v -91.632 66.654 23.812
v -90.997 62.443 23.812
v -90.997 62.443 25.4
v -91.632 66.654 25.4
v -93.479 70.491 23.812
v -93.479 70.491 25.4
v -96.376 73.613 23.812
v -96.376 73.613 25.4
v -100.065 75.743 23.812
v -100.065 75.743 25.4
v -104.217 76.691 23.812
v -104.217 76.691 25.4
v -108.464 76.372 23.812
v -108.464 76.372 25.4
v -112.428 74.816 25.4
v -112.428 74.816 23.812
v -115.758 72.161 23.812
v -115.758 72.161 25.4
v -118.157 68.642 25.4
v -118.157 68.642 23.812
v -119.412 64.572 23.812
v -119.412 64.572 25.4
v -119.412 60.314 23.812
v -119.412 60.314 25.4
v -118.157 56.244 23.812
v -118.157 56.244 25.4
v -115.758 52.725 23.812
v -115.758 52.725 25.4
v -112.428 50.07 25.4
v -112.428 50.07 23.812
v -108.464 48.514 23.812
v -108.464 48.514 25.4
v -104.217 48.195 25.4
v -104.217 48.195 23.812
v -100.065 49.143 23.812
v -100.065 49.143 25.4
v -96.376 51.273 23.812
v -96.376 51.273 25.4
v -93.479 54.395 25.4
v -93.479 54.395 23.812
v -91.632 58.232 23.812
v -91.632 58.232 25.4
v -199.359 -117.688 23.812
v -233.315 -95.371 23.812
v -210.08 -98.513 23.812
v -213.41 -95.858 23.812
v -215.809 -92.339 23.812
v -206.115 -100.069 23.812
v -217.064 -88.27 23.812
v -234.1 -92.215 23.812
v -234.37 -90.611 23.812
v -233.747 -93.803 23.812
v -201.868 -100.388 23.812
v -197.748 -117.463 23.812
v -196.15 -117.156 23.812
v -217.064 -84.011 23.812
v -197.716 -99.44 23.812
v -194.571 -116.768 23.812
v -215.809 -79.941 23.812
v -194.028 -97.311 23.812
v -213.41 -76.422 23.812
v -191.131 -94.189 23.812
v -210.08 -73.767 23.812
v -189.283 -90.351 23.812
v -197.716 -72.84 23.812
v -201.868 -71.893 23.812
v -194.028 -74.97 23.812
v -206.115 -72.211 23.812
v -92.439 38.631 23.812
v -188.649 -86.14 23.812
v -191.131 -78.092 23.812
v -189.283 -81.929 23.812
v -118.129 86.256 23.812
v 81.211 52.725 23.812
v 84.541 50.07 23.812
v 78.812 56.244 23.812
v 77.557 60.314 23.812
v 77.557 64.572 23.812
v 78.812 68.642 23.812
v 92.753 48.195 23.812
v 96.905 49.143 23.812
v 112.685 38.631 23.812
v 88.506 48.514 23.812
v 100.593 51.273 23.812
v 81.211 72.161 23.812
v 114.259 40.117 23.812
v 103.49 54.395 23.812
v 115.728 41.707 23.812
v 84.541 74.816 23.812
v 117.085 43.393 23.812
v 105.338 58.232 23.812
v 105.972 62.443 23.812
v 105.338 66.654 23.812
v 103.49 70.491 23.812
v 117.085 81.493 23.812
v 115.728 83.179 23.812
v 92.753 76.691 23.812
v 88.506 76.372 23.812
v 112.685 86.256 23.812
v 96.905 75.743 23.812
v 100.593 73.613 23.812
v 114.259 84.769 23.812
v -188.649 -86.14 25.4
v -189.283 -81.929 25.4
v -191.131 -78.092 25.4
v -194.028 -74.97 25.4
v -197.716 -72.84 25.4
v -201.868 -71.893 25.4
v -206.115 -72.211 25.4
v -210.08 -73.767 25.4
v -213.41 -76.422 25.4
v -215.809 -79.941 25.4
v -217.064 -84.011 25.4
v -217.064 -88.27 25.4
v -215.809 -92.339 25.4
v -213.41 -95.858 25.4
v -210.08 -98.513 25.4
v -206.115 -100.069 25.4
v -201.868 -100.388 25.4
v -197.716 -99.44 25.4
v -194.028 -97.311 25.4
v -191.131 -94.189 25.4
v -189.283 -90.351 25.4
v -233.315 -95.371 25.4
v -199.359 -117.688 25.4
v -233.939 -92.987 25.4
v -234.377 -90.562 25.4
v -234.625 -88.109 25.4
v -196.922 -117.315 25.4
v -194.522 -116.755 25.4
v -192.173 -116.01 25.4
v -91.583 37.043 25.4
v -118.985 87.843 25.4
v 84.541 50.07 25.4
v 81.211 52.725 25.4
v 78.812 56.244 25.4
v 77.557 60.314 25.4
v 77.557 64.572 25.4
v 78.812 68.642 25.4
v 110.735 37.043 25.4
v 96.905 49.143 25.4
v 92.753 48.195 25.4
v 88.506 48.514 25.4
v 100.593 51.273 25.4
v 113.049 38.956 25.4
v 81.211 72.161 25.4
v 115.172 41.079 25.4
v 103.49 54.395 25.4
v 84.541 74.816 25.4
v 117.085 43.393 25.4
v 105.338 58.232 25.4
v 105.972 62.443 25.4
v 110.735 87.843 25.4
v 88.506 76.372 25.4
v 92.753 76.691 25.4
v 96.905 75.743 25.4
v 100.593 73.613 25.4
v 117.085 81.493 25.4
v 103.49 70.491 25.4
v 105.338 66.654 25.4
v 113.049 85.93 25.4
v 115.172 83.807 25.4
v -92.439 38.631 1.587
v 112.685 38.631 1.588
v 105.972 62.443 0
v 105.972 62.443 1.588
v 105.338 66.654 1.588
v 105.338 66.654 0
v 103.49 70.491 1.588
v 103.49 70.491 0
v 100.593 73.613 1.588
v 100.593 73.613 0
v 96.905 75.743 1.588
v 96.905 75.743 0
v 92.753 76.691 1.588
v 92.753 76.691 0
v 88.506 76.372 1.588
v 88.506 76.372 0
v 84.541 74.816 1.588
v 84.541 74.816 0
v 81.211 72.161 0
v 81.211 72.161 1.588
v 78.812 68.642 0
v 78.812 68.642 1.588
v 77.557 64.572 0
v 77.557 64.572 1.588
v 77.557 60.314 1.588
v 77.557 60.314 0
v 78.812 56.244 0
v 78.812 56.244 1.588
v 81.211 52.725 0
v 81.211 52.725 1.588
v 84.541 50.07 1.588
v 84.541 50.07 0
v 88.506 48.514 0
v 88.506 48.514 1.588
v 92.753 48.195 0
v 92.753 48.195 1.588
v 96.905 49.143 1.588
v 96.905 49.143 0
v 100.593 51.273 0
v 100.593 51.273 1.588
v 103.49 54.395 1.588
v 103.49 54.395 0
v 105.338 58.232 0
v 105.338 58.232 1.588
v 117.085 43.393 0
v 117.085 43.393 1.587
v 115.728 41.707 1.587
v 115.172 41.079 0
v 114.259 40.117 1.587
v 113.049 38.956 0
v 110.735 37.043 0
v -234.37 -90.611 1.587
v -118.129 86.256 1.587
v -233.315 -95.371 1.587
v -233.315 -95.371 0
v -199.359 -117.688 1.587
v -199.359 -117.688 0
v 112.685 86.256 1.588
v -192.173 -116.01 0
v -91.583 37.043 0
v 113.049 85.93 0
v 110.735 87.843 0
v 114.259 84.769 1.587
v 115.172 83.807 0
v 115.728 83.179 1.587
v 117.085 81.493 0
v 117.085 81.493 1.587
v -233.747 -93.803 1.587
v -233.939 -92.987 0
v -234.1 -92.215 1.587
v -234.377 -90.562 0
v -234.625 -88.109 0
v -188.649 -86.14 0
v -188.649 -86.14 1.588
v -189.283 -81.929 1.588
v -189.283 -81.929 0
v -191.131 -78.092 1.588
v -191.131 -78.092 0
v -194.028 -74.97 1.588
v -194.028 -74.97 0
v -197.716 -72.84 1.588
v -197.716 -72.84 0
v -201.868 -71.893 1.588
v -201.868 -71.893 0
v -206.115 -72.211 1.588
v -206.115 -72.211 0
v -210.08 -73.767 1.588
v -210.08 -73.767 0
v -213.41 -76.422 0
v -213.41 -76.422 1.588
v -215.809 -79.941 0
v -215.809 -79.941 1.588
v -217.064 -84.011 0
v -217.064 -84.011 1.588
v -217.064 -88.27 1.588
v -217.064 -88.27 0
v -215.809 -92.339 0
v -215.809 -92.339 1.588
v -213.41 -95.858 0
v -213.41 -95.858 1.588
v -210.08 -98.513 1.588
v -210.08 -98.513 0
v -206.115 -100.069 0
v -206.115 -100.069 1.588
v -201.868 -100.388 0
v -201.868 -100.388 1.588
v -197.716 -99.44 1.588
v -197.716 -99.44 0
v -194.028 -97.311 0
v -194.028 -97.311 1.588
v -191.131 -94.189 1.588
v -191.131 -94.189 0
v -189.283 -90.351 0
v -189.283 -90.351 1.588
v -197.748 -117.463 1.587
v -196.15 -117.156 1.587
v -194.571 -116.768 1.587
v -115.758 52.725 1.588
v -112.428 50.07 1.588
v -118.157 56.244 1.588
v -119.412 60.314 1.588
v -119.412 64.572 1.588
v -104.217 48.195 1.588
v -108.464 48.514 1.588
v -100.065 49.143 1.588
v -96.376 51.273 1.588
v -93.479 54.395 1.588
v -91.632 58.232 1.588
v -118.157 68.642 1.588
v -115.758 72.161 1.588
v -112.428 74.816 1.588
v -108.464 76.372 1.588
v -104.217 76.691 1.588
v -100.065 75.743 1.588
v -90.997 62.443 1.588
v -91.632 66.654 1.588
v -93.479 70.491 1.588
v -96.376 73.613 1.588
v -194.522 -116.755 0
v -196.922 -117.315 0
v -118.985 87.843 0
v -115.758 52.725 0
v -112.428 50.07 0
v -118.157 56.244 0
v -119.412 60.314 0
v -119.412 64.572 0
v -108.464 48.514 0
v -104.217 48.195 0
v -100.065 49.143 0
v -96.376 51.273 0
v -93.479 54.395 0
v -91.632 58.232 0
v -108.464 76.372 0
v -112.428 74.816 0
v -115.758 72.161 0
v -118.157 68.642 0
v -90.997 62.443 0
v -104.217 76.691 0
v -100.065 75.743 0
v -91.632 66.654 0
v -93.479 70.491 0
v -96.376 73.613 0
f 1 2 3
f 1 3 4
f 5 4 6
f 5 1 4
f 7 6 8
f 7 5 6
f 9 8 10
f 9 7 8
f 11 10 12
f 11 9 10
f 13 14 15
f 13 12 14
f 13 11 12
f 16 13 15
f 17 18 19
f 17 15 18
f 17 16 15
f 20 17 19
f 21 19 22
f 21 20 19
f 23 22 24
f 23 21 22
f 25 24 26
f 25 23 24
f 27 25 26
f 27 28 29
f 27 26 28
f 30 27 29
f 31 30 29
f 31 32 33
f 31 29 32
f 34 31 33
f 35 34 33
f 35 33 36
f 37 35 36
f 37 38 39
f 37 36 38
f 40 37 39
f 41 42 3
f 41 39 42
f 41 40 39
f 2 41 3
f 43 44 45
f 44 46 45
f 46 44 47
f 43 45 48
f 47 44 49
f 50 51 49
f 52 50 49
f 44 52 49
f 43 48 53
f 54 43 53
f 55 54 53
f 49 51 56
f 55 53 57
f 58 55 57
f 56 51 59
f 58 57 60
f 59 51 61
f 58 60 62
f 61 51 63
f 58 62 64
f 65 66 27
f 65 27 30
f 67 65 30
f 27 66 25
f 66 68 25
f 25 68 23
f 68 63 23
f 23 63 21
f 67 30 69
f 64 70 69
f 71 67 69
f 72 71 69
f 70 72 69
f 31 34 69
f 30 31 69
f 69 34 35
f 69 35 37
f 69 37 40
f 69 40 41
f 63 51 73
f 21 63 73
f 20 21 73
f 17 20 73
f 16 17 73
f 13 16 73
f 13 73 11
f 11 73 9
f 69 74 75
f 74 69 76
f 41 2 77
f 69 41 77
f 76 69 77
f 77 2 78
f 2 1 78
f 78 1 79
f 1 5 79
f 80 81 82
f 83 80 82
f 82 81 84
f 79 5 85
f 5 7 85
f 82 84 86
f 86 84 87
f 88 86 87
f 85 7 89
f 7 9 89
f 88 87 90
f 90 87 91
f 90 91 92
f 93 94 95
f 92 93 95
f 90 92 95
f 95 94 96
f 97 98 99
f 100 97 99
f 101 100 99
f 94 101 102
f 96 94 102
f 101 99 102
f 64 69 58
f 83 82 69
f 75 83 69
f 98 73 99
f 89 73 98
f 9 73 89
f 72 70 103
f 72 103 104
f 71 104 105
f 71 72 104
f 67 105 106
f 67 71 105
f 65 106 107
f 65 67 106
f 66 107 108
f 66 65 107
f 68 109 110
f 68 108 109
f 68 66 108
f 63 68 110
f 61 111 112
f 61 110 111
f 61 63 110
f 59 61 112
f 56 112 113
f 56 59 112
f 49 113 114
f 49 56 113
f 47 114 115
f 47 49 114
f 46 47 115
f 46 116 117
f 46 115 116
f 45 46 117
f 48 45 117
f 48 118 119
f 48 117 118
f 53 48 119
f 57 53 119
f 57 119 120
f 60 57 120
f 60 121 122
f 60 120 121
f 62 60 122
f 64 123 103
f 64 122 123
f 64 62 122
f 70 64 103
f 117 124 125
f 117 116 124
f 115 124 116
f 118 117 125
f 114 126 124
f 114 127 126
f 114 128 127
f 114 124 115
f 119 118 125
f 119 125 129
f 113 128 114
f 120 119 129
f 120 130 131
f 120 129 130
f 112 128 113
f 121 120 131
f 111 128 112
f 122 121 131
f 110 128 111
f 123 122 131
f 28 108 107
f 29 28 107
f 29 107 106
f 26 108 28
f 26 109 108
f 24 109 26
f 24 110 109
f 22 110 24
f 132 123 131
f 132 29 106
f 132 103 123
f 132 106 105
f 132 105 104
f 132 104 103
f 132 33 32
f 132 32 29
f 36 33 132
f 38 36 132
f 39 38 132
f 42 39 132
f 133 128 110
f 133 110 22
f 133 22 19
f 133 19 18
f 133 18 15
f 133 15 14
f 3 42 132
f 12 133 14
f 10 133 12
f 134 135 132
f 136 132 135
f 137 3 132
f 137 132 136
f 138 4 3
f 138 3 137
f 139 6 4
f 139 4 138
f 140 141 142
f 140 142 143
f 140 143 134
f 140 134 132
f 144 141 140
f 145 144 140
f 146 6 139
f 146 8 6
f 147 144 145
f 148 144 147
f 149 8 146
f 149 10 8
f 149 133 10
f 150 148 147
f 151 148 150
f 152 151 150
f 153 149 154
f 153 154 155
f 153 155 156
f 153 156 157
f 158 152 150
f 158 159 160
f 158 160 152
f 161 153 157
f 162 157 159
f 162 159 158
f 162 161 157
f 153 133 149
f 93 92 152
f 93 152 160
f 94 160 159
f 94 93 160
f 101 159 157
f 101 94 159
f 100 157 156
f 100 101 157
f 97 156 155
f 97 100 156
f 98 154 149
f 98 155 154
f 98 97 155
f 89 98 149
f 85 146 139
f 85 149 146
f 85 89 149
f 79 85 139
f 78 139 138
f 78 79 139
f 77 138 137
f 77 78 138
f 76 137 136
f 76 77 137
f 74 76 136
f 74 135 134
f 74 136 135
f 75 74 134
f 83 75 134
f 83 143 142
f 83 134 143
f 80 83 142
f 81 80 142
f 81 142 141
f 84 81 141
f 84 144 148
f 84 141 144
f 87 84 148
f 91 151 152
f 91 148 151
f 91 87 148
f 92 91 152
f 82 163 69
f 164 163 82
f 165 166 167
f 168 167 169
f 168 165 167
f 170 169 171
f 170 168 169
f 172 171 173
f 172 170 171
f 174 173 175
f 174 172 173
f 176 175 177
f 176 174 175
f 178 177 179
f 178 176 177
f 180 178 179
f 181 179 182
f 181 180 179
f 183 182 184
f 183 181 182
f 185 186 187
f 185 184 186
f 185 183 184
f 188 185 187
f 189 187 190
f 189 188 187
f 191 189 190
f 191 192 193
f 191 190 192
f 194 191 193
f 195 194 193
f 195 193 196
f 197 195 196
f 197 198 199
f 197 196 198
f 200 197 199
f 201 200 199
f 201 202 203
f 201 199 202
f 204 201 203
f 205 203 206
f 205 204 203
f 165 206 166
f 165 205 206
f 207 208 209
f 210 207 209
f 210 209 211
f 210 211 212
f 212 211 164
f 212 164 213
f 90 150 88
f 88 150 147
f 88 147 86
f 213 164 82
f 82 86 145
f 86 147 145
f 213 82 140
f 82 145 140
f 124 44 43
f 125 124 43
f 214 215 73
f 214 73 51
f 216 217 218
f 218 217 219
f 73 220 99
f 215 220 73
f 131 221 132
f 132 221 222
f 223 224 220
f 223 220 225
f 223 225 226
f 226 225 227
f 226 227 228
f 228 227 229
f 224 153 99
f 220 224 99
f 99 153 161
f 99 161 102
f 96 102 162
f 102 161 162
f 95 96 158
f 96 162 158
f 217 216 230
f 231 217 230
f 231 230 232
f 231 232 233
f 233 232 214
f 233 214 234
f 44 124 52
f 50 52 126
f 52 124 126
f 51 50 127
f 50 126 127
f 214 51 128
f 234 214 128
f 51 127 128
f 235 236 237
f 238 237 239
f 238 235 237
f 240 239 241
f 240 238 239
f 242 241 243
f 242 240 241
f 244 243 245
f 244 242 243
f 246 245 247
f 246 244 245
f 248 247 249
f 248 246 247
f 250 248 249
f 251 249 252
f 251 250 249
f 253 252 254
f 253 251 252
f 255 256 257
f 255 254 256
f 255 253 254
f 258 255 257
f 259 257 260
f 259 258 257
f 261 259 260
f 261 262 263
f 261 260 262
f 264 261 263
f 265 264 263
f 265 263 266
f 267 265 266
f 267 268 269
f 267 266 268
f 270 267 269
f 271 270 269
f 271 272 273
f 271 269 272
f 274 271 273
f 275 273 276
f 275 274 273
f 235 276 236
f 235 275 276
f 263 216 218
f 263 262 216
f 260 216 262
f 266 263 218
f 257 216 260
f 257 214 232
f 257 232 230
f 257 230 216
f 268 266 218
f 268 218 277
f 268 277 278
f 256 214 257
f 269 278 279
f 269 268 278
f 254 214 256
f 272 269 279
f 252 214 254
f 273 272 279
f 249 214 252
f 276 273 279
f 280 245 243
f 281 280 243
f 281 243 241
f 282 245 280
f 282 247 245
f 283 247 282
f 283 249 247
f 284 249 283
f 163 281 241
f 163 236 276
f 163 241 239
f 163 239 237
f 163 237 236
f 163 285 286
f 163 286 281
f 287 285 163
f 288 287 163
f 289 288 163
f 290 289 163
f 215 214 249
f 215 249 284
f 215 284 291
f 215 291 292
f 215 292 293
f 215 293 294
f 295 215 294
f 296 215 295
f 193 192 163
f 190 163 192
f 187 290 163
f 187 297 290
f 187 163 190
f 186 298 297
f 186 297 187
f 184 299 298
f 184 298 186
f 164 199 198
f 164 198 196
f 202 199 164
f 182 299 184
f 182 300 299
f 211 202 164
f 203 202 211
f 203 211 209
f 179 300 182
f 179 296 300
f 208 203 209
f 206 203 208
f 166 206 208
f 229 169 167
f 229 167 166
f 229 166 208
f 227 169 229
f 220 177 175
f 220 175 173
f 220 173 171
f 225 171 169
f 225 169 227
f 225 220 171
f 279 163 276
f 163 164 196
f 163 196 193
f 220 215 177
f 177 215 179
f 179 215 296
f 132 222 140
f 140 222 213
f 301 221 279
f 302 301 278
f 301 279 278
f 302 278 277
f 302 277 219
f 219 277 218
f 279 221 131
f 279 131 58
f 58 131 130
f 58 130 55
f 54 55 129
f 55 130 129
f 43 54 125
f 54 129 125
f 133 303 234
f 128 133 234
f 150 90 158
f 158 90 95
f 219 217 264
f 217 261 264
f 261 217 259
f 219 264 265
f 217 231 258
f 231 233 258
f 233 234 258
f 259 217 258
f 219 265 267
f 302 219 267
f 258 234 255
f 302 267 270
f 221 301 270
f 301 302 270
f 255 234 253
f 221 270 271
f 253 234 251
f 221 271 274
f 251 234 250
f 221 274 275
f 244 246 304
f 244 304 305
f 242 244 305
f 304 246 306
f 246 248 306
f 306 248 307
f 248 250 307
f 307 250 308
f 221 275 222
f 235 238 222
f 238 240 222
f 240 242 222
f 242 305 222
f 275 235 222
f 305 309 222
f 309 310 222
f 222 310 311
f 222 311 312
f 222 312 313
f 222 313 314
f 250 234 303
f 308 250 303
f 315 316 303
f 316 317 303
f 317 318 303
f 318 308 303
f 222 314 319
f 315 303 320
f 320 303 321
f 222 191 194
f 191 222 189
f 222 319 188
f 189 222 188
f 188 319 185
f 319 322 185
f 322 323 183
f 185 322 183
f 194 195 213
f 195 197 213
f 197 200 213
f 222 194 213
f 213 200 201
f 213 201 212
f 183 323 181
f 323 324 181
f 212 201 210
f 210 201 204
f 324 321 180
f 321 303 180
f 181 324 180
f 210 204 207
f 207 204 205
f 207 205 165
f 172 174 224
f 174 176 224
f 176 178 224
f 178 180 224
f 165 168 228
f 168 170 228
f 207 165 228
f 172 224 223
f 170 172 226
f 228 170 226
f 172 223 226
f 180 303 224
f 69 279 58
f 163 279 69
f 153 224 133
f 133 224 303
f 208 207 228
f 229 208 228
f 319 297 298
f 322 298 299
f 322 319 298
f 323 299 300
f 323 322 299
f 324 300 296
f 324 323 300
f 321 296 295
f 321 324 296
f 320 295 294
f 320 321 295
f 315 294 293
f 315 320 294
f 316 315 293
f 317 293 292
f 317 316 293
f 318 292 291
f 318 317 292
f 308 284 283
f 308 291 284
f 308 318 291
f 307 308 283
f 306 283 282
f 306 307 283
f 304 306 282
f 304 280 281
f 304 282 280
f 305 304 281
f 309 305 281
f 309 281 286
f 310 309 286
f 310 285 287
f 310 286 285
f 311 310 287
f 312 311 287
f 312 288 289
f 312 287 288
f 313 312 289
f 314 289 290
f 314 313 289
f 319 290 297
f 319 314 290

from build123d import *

# Parameters (mm, degrees)
BOSS_EXTRUDE2_DEPTH = 25.4
SHELL1_T            = -1.5875
SKETCH4_W           = 47.625
SKETCH4_H           = 22.225
CUT_EXTRUDE1_DEPTH  = 25.4
SKETCH5_R           = 14.2875
CUT_EXTRUDE2_DEPTH  = 268.575466435
CUT_EXTRUDE4_DEPTH  = 25.4


with BuildPart() as part:
    # Sketch3 → Boss-Extrude2 (new body)
    with BuildSketch(Plane.XY):
        Polygon((117.084839529, 87.84302106), (-118.985491202, 87.84302106), (-237.562751028, -92.579381795), (-195.110420945, -120.479913519), (-91.583155779, 37.04302106), (117.084839529, 37.04302106), align=None)
    extrude(amount=BOSS_EXTRUDE2_DEPTH)

    # Shell1
    shell1_openings = [part.faces().sort_by_distance(p)[0] for p in [
        (117.084839529, 62.44302106, 12.7),
    ]]
    offset(amount=SHELL1_T, openings=shell1_openings, kind=Kind.INTERSECTION)

    # Sketch4 → Cut-Extrude1 (cut)
    with BuildSketch(Plane(origin=(-114.151230572, -173.687934254, 0), x_dir=(0.8356757890471017, -0.549223065430162, 0), z_dir=(-0.549223065430162, -0.8356757890471017, 0))):
        with Locations((-122.278707548, 12.7)):
            Rectangle(SKETCH4_W, SKETCH4_H)
    extrude(amount=-CUT_EXTRUDE1_DEPTH, mode=Mode.SUBTRACT)

    # Sketch5 → Cut-Extrude2 (cut, through all)
    with BuildSketch(Plane.XY):
        with Locations((-202.936184524, -86.140134233)):
            Circle(SKETCH5_R)
        with Locations((91.684839529, 62.44302106)):
            Circle(SKETCH5_R)
        with Locations((-105.28432349, 62.44302106)):
            Circle(SKETCH5_R)
    extrude(amount=CUT_EXTRUDE2_DEPTH, mode=Mode.SUBTRACT)

    # Sketch6 → Cut-Extrude4 (cut)
    with BuildSketch(Plane.XY.offset(25.4)):
        with BuildLine():
            Line((117.084839529, 81.49302106), (117.084839529, 87.84302106))
            Line((117.084839529, 87.84302106), (110.734839529, 87.84302106))
            ThreePointArc((110.734839529, 87.84302106), (114.135479832, 84.893661363), (117.084839529, 81.49302106))
        make_face()
        with BuildLine():
            Line((117.084839529, 37.04302106), (117.084839529, 43.39302106))
            ThreePointArc((117.084839529, 43.39302106), (114.135479832, 39.992380757), (110.734839529, 37.04302106))
            Line((110.734839529, 37.04302106), (117.084839529, 37.04302106))
        make_face()
        with BuildLine():
            ThreePointArc((-233.314578978, -95.371366566), (-234.181501959, -91.778630344), (-234.625048962, -88.109492152))
            Line((-234.625048962, -88.109492152), (-237.562751028, -92.579381795))
            Line((-237.562751028, -92.579381795), (-233.314578978, -95.371366566))
        make_face()
        with BuildLine():
            Line((-195.110420945, -120.479913519), (-192.172718878, -116.010023876))
            ThreePointArc((-192.172718878, -116.010023876), (-195.716744004, -117.058448847), (-199.358592995, -117.687928749))
            Line((-199.358592995, -117.687928749), (-195.110420945, -120.479913519))
        make_face()
    extrude(amount=-CUT_EXTRUDE4_DEPTH, mode=Mode.SUBTRACT)


solid = part.part
